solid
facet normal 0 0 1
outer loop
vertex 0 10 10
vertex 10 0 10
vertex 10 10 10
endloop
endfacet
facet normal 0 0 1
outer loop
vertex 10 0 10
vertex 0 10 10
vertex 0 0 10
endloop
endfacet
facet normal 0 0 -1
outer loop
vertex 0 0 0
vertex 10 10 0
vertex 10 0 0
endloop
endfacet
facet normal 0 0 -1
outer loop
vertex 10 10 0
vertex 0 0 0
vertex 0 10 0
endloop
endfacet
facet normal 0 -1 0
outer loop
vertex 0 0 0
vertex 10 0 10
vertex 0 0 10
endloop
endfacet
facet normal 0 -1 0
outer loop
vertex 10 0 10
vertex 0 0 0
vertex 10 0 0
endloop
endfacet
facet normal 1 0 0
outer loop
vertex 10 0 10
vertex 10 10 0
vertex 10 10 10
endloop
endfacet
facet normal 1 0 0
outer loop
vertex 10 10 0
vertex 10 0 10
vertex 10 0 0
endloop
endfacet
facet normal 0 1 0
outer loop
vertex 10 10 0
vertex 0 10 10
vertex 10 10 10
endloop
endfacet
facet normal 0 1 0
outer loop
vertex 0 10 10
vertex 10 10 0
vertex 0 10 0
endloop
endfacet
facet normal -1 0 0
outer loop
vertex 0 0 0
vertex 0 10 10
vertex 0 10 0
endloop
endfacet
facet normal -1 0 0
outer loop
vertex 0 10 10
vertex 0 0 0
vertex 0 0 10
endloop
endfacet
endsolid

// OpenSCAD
// Basic shapes
// cube([10, 10, 10]);
// sphere(r=10);
// cylinder(h=10, r=4);
// cylinder(h=10, r=10, r2=5);
// cylinder(h=10, r=10, $fn=6);

// Difference
difference() {
    cube([10, 10, 10]);
}

// Union
